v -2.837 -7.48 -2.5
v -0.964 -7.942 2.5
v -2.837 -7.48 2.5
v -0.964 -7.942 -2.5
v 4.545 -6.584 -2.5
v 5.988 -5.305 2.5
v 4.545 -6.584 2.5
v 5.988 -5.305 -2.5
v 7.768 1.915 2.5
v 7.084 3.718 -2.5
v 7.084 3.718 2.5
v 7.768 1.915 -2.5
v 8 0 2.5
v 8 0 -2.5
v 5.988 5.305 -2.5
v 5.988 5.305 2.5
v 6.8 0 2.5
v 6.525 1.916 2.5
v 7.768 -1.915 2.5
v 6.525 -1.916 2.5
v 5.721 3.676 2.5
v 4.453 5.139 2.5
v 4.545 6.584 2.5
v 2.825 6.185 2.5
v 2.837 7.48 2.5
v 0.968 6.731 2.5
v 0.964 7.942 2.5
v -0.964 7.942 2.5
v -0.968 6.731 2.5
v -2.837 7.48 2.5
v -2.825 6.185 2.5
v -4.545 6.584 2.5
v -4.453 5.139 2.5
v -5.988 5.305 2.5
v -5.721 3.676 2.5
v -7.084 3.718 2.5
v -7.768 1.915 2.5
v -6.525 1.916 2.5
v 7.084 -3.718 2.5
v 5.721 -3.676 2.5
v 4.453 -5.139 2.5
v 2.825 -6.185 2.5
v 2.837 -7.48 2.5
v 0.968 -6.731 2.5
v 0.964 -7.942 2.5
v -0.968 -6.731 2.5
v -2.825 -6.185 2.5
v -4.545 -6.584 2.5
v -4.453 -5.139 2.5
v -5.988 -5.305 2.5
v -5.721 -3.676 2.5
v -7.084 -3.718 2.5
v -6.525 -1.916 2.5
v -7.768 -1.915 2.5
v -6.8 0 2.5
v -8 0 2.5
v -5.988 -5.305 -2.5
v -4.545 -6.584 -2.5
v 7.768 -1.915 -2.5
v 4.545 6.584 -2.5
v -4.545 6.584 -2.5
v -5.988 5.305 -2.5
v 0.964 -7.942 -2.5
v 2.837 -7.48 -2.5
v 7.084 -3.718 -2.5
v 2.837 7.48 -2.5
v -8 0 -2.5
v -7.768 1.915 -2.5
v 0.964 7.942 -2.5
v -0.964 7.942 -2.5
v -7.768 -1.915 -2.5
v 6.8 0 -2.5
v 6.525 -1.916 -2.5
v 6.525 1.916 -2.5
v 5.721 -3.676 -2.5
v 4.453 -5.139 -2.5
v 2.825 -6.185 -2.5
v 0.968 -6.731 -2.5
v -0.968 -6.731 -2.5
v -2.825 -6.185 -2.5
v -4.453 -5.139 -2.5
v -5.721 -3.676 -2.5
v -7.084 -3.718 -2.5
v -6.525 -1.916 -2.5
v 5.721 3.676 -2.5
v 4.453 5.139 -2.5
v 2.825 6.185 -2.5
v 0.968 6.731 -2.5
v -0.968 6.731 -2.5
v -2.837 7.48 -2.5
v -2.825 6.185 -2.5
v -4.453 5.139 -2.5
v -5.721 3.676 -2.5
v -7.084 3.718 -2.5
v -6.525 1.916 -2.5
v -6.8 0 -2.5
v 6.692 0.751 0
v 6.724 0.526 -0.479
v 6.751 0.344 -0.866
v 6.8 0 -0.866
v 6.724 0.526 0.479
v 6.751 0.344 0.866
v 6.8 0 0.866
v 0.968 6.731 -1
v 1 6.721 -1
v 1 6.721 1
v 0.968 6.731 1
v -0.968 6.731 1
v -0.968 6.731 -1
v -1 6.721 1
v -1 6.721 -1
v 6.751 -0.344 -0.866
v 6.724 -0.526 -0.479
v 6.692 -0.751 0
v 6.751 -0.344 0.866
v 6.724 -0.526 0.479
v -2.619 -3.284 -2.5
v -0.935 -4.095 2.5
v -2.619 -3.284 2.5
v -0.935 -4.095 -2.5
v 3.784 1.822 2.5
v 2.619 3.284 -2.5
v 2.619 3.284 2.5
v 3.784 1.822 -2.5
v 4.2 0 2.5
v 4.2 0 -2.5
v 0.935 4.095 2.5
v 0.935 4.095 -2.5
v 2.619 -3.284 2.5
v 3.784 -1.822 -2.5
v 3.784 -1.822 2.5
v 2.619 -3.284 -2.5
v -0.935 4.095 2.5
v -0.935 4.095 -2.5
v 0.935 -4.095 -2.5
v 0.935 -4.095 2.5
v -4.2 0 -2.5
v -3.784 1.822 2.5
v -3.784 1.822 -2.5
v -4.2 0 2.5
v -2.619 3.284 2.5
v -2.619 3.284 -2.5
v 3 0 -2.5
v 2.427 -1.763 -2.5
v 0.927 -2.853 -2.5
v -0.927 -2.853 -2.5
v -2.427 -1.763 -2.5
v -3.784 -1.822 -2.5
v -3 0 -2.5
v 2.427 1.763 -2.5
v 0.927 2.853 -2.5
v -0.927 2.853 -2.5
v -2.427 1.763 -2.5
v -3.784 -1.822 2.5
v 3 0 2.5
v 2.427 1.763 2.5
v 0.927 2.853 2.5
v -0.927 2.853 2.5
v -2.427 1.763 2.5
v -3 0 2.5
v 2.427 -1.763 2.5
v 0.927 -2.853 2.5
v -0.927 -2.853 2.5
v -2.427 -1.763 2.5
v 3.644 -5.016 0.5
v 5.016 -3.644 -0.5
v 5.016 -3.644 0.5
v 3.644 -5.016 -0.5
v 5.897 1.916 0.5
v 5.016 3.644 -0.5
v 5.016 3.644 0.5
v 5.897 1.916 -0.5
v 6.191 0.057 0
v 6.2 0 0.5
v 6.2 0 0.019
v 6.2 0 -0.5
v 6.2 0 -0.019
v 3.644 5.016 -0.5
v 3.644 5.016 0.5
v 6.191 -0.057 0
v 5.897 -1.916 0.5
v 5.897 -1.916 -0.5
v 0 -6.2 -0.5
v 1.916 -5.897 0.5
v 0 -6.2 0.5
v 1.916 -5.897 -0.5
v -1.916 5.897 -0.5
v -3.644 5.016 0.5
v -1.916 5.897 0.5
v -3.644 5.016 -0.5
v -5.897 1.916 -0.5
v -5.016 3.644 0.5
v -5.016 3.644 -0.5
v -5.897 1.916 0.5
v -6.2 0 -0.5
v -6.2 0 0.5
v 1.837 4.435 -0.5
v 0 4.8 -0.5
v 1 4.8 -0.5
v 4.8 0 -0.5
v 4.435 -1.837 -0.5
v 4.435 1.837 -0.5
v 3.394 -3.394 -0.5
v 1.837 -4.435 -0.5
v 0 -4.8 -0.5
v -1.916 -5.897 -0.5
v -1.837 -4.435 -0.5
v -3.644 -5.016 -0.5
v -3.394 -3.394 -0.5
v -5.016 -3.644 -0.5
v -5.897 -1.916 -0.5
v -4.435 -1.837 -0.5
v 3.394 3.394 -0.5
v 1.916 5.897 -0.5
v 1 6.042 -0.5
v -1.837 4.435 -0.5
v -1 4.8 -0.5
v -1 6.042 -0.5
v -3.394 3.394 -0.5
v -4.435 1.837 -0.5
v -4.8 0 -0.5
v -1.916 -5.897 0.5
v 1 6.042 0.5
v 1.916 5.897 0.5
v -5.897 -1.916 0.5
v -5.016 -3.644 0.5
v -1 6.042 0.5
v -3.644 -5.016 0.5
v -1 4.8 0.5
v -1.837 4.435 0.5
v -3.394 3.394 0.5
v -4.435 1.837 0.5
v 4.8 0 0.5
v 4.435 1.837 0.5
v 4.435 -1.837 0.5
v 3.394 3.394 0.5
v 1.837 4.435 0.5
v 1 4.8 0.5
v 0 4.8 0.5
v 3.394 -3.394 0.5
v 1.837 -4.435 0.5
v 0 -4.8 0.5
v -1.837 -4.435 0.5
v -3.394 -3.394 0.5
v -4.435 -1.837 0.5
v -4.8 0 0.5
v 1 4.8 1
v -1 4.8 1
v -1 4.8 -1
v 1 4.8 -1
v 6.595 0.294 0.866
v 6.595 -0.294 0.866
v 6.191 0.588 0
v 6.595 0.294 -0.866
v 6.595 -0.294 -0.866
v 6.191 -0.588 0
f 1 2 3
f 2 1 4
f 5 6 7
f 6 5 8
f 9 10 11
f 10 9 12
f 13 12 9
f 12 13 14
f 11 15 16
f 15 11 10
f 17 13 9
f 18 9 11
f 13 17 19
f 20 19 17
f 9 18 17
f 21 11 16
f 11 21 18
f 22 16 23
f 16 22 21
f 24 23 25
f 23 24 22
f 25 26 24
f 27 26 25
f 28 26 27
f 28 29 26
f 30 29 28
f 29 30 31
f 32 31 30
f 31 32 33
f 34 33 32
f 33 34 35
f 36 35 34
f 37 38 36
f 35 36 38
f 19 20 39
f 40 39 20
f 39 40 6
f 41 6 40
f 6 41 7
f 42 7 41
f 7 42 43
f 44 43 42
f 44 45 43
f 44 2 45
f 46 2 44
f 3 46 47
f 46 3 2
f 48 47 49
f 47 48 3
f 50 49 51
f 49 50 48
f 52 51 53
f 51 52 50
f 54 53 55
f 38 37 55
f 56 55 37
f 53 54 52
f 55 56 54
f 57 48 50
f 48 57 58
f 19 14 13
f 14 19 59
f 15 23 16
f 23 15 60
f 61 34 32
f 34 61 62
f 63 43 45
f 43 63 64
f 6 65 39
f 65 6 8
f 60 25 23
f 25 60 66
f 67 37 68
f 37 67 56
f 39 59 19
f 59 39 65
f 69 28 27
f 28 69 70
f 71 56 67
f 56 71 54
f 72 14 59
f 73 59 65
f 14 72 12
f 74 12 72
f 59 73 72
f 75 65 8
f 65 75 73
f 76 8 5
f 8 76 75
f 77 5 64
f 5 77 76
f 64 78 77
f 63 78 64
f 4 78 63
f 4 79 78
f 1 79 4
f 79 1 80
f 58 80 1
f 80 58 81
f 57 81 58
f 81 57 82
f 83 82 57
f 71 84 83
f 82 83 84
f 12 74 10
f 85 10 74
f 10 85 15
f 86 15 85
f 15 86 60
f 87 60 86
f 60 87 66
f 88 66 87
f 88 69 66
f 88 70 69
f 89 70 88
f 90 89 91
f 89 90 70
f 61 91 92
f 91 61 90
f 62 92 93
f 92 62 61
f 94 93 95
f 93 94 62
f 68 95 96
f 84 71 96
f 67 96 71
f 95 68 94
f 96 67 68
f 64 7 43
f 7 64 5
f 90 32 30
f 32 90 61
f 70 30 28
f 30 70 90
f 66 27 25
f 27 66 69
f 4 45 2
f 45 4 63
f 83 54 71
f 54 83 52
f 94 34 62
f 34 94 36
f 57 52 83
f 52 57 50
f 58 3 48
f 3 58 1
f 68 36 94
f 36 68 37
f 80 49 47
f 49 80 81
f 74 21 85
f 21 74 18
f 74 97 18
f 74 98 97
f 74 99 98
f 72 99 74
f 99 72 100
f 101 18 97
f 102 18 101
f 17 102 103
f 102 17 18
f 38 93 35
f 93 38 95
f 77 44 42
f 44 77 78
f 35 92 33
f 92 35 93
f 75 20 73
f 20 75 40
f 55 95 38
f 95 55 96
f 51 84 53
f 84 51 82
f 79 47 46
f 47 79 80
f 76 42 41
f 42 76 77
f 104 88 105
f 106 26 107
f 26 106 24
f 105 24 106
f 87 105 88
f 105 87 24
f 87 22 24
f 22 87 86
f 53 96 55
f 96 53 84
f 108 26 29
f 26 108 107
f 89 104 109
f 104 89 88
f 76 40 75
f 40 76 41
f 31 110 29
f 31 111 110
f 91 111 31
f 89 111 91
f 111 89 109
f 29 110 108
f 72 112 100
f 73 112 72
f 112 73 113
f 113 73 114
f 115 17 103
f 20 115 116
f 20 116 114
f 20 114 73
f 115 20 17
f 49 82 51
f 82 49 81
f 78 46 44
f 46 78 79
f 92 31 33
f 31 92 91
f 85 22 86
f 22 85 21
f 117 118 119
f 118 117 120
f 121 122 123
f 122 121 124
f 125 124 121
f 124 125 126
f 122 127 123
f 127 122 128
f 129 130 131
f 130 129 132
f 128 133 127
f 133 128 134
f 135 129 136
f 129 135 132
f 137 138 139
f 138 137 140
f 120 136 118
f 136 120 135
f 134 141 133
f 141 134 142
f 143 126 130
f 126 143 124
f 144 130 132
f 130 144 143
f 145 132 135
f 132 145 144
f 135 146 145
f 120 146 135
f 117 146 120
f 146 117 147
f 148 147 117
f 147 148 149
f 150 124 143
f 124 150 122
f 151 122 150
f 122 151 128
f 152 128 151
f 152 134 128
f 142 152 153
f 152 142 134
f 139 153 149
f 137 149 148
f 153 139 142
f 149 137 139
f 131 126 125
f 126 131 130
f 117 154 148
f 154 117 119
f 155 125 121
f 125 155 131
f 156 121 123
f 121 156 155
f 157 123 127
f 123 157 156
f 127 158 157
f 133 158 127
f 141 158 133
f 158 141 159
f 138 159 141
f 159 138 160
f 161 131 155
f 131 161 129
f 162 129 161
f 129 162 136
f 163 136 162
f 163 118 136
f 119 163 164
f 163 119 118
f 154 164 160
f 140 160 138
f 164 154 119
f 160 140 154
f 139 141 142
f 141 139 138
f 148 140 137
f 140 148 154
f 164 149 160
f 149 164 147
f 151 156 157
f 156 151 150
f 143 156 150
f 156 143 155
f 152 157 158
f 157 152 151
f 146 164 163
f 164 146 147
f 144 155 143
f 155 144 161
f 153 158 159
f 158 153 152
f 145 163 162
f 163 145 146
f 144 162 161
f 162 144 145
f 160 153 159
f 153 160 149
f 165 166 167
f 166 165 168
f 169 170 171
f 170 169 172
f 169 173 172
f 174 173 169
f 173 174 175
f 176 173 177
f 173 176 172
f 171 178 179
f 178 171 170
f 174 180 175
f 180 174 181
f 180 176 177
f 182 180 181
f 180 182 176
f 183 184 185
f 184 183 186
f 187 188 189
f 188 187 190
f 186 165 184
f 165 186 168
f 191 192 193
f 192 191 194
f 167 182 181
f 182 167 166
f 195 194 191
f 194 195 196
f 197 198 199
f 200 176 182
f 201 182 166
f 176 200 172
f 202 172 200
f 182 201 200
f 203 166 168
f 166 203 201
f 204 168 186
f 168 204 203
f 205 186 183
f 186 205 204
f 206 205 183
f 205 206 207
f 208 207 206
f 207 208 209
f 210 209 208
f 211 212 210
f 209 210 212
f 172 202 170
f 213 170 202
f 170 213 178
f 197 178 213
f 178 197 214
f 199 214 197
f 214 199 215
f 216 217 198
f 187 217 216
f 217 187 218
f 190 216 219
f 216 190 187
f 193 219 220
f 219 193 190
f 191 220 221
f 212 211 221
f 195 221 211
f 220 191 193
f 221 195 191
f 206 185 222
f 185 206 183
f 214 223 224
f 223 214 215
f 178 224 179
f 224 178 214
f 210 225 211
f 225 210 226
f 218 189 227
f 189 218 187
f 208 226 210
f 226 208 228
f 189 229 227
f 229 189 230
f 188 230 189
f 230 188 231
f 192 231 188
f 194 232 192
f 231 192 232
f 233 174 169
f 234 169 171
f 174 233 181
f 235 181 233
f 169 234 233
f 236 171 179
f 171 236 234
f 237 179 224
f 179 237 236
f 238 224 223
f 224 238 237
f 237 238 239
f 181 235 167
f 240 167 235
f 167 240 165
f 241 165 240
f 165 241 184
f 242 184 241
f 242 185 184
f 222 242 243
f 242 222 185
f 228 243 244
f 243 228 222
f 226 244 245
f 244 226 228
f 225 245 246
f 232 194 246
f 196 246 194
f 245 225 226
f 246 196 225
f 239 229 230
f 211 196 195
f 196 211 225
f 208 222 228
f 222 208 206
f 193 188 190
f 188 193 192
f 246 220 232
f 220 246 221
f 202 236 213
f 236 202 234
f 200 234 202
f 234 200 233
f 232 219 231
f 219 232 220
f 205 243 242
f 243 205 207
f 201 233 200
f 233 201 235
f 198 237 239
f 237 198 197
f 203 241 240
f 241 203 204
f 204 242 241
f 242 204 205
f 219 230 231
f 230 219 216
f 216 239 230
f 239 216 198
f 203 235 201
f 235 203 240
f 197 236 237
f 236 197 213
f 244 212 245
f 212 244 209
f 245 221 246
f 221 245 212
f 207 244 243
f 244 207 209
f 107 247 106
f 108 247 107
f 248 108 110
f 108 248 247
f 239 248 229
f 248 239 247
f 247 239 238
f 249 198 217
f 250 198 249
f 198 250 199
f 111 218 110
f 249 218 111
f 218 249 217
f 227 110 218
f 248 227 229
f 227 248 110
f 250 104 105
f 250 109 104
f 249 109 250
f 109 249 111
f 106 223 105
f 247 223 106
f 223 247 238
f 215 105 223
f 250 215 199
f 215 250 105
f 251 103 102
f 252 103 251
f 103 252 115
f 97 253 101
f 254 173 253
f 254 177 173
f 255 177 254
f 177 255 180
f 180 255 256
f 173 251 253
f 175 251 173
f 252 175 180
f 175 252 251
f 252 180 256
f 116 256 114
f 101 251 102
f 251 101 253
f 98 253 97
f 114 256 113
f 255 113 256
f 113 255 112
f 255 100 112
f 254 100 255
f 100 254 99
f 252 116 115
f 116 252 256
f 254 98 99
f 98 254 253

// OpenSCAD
// Parameters
bore_diameter_mm = 6.0; //[3.0:12.0:0.1]
outer_diameter_mm = 16.0; //[8.0:32.0:0.1]
width_mm = 5.0; //[2.5:10.0:0.1]
bore_radius_mm = 3.0; //[1.5:6.0:0.1]
outer_radius_mm = 8.0; //[4.0:16.0:0.1]
eps_mm = 0.6; //[0.2:2.0:0.1]
rim_thickness_mm = 1.2; //[0.6:2.4:0.1]
hub_thickness_mm = 1.2; //[0.6:2.4:0.1]
shield_radial_thickness_mm = 0.8; //[0.4:1.6:0.1]
shield_axial_thickness_mm = 1.0; //[0.5:2.0:0.1]
ball_diameter_mm = 2.0; //[1.0:4.0:0.1]
ball_center_radius_mm = 5.5; //[4.0:7.0:0.1]
flange_enabled = 0; //[0:1:1]
flange_outer_diameter_mm = 18.0; //[16.0:32.0:0.1]
flange_width_mm = 1.0; //[0.5:3.0:0.1]

// Connectivity overlap (1–2mm) to guarantee attachment
overlap_mm = 1.2;

// Ball Bearing - complete geometry (single connected solid)
module ball_bearing_connected() {

  // --- Derived radii (keep consistent with parameters) ---
  R_outer = outer_diameter_mm/2;
  R_outer_inner = R_outer - rim_thickness_mm;

  R_inner_outer = bore_diameter_mm/2 + hub_thickness_mm;
  R_bore = bore_diameter_mm/2;

  // Shield radii (as in original)
  R_shield_outer = R_outer - rim_thickness_mm - eps_mm;
  R_shield_inner = R_inner_outer + eps_mm;

  // --- Marker dimensions (blue rectangular block) ---
  marker_radial_mm = ball_diameter_mm;  // radial thickness (X)
  marker_w_mm      = ball_diameter_mm;  // tangential size (Y)
  marker_h_mm      = ball_diameter_mm;  // axial size (Z)

  // Place marker so it is GUARANTEED to intersect the OUTER RACE material.
  // Outer race material exists for radii in [R_outer_inner, R_outer].
  // Ensure marker spans into that band by at least overlap_mm.
  // We set the marker's OUTER face slightly inside the OD (by overlap_mm),
  // so it cannot float outside and will always cut into the ring.
  marker_center_r = R_outer - overlap_mm - marker_radial_mm/2;

  // --- Ball (kept, but forced to intersect outer race slightly so it cannot float) ---
  ball_r = ball_diameter_mm/2;
  // Ensure the sphere reaches into the outer race band by overlap_mm:
  // sphere outermost radius = ball_center_r + ball_r
  // require >= R_outer_inner + overlap_mm
  ball_center_r_attached = max(ball_center_radius_mm, (R_outer_inner + overlap_mm) - ball_r);

  union() {
    // Main bearing solids
    color("Silver") union() {

      // Outer Race
      difference() {
        cylinder(r=R_outer, h=width_mm, center=true);
        cylinder(r=R_outer_inner, h=width_mm + 2*eps_mm, center=true);
      }

      // Inner Race
      difference() {
        cylinder(r=R_inner_outer, h=width_mm, center=true);
        cylinder(r=R_bore, h=width_mm + 2*eps_mm, center=true);
      }

      // Shield/Seal Annulus
      difference() {
        cylinder(r=R_shield_outer, h=shield_axial_thickness_mm, center=true);
        cylinder(r=R_shield_inner, h=shield_axial_thickness_mm + 2*eps_mm, center=true);
      }

      // Flange (optional)
      if (flange_enabled) {
        difference() {
          translate([0, 0, width_mm/2 - flange_width_mm/2 + eps_mm])
            cylinder(r=flange_outer_diameter_mm/2, h=flange_width_mm, center=true);
          translate([0, 0, width_mm/2 - flange_width_mm/2 + eps_mm])
            cylinder(r=R_outer_inner, h=flange_width_mm + 2*eps_mm, center=true);
        }
      }
    }

    // --- FIX: Blue marker is physically fused to the outer race (no floating) ---
    // Rotate to match the shown views (marker at "top" in right view).
    color("Blue")
      rotate([0, 0, 90])
        translate([marker_center_r, 0, 0])
          cube([marker_radial_mm, marker_w_mm, marker_h_mm], center=true);

    // --- Ball fused (no floating) ---
    // Unioned and positioned to intersect the outer race by overlap_mm.
    color("Copper")
      translate([ball_center_r_attached, 0, 0])
        sphere(r=ball_r);
  }
}

ball_bearing_connected();
